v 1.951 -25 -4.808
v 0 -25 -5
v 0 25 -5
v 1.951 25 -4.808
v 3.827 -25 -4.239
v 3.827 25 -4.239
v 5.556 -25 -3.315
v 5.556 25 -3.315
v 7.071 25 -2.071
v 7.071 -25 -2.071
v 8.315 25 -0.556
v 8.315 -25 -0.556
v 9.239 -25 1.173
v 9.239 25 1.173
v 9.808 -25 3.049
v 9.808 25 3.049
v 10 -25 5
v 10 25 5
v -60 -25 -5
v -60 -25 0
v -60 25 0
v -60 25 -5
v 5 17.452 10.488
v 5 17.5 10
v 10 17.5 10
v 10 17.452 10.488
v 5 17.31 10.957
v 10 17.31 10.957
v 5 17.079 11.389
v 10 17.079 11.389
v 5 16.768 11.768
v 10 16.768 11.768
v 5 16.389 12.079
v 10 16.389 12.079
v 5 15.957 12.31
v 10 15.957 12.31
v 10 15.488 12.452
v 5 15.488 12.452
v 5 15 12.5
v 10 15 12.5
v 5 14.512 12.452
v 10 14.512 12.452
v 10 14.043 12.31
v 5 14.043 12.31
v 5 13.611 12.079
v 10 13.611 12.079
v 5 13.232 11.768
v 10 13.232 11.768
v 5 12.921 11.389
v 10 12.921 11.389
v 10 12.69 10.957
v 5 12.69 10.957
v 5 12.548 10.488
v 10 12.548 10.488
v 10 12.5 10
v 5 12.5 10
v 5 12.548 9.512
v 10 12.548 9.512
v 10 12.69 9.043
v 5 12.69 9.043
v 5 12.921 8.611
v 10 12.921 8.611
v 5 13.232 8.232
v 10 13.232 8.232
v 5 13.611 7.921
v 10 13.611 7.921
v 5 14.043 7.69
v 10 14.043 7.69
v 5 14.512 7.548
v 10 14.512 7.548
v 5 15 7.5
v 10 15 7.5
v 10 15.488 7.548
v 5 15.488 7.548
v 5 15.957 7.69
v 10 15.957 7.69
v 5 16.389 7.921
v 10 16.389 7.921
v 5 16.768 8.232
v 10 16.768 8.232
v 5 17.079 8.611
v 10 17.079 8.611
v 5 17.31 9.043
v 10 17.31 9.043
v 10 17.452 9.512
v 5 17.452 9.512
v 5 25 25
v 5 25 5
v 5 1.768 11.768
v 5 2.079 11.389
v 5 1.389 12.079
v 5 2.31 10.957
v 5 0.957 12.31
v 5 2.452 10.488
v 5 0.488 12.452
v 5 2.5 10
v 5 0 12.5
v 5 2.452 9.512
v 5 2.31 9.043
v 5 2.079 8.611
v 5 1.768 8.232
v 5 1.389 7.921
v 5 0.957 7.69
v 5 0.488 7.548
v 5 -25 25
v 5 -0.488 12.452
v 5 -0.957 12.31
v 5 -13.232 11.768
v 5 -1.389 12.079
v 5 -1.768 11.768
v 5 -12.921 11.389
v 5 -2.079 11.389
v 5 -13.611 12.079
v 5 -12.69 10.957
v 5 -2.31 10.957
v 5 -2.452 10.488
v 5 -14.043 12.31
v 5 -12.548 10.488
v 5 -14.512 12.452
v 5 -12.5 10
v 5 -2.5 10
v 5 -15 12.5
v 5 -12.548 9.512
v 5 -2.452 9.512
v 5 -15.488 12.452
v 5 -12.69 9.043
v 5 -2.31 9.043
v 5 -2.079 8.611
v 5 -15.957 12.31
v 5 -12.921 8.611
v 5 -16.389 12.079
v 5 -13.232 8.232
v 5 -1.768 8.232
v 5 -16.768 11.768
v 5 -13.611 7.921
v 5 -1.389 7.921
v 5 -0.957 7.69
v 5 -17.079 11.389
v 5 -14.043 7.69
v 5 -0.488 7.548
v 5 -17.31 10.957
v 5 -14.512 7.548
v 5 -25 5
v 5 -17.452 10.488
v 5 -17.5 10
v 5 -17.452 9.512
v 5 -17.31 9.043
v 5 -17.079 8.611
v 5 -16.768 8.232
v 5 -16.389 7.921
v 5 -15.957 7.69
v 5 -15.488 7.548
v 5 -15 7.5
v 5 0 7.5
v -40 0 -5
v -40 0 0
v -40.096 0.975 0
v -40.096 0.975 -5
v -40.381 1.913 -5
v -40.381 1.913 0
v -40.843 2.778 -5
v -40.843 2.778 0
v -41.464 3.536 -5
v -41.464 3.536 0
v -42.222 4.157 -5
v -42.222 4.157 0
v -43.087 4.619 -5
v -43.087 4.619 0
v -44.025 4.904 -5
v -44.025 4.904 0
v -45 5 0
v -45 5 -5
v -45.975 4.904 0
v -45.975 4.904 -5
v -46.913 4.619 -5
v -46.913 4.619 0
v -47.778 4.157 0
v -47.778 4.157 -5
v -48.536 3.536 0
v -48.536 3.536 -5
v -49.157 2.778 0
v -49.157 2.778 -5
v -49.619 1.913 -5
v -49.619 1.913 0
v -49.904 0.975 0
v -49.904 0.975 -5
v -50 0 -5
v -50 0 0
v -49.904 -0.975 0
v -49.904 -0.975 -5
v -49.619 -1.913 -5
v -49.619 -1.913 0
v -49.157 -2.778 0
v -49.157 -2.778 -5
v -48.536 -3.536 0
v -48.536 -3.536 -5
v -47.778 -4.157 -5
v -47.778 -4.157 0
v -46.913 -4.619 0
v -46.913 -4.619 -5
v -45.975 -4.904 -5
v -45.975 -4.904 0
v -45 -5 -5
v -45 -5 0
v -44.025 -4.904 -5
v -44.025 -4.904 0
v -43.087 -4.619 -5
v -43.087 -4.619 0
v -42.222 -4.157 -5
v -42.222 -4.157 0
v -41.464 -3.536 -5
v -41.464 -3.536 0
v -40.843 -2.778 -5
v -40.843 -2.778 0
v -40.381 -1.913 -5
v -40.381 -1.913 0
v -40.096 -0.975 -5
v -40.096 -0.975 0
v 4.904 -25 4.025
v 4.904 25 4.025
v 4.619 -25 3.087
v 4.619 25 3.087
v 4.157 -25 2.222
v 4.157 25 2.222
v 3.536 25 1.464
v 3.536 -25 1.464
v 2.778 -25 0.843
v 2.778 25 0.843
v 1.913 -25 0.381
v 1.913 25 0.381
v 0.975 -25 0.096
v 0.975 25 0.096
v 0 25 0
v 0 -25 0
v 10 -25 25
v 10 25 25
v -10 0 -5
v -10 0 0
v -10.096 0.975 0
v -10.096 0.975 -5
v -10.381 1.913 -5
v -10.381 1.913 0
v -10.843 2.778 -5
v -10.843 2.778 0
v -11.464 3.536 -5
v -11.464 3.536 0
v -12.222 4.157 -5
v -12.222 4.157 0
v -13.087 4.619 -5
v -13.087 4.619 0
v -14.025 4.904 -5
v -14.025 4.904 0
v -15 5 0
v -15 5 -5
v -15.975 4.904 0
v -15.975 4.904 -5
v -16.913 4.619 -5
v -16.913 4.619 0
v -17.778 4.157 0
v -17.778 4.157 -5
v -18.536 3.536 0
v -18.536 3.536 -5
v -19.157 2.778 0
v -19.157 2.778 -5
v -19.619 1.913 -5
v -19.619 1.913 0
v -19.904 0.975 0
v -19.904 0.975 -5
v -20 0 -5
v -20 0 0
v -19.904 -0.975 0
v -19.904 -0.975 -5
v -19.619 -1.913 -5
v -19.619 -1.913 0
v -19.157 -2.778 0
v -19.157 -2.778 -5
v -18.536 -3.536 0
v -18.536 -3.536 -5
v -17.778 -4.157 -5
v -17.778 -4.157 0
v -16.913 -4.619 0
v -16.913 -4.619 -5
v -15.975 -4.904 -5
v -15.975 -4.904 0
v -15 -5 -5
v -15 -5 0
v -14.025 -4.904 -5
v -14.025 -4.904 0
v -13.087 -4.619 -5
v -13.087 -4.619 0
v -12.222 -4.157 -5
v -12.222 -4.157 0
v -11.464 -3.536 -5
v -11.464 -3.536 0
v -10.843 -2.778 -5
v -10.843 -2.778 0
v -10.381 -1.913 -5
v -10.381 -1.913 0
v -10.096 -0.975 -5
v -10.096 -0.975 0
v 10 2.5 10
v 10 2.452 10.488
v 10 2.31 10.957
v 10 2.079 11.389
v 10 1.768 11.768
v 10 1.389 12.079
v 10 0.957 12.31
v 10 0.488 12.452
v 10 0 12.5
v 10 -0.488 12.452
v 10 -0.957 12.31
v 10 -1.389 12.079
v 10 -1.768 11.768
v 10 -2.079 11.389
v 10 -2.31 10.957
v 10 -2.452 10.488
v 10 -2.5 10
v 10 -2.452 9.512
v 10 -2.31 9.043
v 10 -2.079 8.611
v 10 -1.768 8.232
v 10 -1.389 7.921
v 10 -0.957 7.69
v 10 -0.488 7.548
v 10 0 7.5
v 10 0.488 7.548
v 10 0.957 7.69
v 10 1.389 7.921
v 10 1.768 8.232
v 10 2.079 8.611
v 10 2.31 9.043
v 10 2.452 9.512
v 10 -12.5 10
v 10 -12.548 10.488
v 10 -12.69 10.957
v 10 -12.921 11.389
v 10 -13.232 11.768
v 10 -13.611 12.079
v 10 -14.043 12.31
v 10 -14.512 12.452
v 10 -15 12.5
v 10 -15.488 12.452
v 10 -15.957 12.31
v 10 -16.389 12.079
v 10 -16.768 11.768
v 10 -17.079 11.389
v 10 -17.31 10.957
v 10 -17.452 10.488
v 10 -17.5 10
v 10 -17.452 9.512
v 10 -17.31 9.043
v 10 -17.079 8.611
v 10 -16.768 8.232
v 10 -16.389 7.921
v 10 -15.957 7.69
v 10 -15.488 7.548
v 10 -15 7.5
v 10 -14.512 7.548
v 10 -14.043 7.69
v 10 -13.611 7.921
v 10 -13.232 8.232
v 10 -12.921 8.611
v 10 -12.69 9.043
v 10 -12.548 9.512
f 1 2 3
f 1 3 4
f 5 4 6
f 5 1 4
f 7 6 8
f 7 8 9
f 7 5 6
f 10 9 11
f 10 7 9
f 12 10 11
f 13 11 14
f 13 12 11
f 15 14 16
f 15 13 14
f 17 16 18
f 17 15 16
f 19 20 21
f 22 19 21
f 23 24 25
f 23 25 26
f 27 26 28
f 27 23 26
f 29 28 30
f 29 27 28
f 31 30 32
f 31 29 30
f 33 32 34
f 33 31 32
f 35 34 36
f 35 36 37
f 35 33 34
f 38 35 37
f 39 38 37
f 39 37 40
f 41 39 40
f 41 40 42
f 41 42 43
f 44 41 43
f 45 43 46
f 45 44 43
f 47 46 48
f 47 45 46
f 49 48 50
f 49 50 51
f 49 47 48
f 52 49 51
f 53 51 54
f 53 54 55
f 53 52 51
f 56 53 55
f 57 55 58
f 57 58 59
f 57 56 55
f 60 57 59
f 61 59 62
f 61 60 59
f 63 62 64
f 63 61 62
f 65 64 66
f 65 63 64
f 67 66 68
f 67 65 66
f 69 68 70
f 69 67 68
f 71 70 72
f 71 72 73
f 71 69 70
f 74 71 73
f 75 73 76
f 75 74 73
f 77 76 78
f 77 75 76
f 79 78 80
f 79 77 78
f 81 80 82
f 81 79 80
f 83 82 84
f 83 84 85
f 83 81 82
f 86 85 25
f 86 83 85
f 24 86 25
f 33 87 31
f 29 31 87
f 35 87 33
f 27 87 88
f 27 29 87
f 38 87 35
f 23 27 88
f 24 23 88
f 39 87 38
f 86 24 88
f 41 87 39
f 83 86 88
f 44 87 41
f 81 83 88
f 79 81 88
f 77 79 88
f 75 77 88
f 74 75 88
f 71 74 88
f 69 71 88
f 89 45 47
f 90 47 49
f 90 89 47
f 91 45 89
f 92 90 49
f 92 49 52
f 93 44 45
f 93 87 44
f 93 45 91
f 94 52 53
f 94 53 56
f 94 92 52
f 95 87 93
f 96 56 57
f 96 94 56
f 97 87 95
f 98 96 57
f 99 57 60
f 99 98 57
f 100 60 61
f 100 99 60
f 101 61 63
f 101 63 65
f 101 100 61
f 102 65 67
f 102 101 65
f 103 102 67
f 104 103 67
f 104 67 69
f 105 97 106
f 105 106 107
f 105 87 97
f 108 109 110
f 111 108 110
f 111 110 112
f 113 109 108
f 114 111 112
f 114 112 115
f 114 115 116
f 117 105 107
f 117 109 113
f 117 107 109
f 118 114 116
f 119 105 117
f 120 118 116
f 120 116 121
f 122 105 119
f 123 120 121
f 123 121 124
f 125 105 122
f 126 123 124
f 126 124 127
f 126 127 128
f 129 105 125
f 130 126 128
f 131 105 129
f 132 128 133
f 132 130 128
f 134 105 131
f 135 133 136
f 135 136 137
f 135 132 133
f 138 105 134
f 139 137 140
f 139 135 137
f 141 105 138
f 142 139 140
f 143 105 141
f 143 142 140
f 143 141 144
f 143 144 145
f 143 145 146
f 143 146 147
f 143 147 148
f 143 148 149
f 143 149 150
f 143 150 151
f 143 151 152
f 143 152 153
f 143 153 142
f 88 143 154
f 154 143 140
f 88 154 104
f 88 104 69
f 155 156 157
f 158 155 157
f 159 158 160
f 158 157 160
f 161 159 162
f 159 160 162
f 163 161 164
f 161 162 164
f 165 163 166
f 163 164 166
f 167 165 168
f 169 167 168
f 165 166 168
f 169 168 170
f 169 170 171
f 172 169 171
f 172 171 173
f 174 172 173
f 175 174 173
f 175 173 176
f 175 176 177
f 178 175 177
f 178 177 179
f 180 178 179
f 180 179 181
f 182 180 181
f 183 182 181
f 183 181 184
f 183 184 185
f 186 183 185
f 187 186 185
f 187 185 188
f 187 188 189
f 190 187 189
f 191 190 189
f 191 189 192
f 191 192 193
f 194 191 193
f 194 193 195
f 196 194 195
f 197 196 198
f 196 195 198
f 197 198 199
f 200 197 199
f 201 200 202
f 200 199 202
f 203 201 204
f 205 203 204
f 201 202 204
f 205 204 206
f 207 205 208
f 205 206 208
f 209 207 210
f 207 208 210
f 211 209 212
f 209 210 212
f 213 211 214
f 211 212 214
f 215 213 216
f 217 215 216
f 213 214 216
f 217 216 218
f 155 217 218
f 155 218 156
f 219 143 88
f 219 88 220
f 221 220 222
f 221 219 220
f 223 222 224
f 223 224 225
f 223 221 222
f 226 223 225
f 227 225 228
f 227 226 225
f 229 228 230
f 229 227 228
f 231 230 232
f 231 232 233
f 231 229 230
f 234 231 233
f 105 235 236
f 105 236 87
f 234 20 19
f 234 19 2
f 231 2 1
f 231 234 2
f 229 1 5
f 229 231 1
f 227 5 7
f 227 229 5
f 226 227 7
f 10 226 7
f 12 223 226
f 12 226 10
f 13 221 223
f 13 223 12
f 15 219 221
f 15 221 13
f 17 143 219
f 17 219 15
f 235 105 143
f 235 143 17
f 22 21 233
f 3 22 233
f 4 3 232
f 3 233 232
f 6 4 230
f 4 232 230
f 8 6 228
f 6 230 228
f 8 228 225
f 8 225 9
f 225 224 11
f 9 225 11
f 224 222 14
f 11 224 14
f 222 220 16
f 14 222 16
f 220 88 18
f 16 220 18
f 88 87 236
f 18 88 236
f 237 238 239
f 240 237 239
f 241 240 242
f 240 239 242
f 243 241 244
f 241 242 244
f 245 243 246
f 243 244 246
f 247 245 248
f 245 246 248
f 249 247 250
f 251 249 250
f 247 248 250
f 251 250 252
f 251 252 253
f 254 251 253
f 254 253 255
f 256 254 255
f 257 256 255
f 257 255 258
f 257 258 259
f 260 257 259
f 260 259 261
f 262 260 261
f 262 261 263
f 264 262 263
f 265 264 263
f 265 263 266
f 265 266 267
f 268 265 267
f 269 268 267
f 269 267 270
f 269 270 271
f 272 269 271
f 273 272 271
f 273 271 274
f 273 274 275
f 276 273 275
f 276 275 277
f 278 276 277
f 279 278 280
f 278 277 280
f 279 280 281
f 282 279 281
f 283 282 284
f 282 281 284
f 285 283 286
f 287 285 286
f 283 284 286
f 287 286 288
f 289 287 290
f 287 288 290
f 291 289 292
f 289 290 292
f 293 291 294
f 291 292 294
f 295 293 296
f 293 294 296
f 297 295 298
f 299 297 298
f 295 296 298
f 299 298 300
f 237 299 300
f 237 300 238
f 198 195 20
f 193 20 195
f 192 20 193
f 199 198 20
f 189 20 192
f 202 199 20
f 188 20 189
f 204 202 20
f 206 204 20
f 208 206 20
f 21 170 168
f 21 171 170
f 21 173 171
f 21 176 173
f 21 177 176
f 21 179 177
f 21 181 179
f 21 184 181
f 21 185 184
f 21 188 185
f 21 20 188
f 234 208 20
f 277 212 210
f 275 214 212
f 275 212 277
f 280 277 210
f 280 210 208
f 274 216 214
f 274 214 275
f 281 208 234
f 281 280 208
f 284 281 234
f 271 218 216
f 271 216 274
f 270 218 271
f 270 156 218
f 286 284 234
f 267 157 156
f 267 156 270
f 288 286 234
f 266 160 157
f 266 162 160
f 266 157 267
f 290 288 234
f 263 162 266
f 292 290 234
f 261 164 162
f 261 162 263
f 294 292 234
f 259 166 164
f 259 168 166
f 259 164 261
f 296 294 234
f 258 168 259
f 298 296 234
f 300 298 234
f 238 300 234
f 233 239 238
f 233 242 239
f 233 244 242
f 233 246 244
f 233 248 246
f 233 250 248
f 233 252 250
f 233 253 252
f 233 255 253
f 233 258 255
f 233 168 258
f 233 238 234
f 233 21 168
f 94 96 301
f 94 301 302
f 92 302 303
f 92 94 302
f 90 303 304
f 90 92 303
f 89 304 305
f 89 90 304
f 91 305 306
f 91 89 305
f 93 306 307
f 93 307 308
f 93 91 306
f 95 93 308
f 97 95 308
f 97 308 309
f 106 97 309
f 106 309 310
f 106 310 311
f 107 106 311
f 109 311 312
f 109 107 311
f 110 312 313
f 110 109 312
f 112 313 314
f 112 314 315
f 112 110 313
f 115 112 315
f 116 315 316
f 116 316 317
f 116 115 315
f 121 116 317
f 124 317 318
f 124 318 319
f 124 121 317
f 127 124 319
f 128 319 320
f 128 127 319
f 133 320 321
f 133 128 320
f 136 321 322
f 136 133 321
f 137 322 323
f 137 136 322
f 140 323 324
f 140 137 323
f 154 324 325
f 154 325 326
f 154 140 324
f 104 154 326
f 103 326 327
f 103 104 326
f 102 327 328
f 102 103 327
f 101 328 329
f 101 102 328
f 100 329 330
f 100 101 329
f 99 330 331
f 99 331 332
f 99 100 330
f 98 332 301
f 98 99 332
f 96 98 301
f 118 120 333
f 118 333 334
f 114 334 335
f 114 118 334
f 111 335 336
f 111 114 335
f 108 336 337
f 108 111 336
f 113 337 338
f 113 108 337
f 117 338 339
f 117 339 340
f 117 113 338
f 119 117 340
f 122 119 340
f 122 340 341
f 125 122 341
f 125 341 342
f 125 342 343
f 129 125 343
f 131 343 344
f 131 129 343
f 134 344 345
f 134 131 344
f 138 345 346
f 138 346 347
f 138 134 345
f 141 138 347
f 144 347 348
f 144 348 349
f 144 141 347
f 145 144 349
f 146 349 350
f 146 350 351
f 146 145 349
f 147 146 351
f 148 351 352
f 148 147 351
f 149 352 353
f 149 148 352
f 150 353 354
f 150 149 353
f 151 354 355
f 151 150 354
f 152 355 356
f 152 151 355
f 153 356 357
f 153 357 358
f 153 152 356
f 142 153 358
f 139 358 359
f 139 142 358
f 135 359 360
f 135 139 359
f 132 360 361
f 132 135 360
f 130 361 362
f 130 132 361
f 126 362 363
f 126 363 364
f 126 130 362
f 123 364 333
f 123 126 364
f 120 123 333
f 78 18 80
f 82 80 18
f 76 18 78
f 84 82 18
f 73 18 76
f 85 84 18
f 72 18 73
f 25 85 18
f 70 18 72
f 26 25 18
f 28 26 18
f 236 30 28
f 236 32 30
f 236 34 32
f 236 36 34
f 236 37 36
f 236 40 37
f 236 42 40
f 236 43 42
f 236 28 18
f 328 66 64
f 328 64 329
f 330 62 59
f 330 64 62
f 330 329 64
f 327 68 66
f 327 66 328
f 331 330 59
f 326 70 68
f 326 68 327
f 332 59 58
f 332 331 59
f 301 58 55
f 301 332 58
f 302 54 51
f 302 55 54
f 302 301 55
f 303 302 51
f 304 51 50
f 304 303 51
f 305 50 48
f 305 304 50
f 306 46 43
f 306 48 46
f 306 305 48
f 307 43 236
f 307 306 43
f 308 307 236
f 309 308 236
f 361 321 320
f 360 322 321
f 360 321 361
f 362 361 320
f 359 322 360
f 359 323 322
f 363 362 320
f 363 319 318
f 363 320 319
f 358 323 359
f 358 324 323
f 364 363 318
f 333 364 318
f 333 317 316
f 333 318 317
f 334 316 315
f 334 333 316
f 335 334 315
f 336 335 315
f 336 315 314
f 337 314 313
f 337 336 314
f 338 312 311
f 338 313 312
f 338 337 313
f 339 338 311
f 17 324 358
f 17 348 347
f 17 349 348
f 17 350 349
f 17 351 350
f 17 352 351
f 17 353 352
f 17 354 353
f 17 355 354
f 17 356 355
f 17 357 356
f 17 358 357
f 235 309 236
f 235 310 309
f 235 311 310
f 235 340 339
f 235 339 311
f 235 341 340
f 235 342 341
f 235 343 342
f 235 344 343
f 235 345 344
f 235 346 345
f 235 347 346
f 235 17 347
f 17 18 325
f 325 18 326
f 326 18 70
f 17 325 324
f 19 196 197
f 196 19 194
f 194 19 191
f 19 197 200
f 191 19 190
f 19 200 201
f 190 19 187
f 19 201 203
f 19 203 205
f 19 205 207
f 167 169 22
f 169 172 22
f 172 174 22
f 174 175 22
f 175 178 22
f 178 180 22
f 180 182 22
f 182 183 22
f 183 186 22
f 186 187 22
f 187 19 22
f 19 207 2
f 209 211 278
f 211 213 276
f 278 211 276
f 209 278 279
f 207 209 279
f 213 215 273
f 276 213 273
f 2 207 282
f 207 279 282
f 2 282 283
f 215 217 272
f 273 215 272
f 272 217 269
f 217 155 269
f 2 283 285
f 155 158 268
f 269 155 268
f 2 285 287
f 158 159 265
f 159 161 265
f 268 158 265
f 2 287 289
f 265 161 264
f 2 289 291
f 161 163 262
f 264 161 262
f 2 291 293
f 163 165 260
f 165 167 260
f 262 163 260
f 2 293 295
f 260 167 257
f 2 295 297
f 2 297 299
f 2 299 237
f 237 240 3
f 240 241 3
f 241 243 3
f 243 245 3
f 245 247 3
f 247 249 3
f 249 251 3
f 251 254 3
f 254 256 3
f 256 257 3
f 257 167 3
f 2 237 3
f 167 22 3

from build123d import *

# Parameters (mm, degrees)
SKETCH1_W           = 60
SKETCH1_H           = 50
BASE_FLANGE1_DEPTH  = 5
SKETCH6_R           = 5
CUT_EXTRUDE1_DEPTH  = 66.192024052
EDGE_FLANGE1_DEPTH  = 50
HOLE1_START         = 5
HOLE1_OUTLINE_R     = 2.5
HOLE1_DEPTH         = 5
LPATTERN1_COUNT     = 2
LPATTERN1_PITCH     = 15
LPATTERN1_COL_COUNT = 2
LPATTERN1_COL_PITCH = 15


# Read off the part's stored shape, not the designer's step: Hole1
# Sheet-metal steps are written as plain solids
with BuildPart() as part:
    # Sketch1 → Base-Flange1 (new body)
    with BuildSketch(Plane.XY):
        with Locations((-30, 0)):
            Rectangle(SKETCH1_W, SKETCH1_H)
    extrude(amount=-BASE_FLANGE1_DEPTH)

    # Sketch6 → Cut-Extrude1 (cut, through all)
    with BuildSketch(Plane.XY):
        with Locations((-45, 0)):
            Circle(SKETCH6_R)
        with Locations((-15, 0)):
            Circle(SKETCH6_R)
    extrude(amount=-CUT_EXTRUDE1_DEPTH, mode=Mode.SUBTRACT)

    # Edge-Flange1 section (across the edge) → Edge-Flange1 (add)
    with BuildSketch(Plane(origin=(5, -25, 0), x_dir=(-1, 0, 0), z_dir=(0, 1, 0))):
        with BuildLine():
            Line((-5, 5), (-5, 25))
            Line((-5, 25), (0, 25))
            Line((0, 25), (0, 5))
            ThreePointArc((0, 5), (1.464466094, 1.464466094), (5, 0))
            Line((5, 0), (5, -5))
            ThreePointArc((5, -5), (-2.071067812, -2.071067812), (-5, 5))
        make_face()
    extrude(amount=EDGE_FLANGE1_DEPTH)

    # Hole1 outline → Hole1 (cut)
    with BuildSketch(Plane.YZ.offset(HOLE1_START)):
        with Locations((0, 10)):
            Circle(HOLE1_OUTLINE_R)
    hole1 = extrude(amount=HOLE1_DEPTH, mode=Mode.SUBTRACT)

    # LPattern1: Hole1 ×2
    with Locations(*[(0, i * LPATTERN1_PITCH, 0) for i in range(1, LPATTERN1_COUNT)]):
        add(hole1, mode=Mode.SUBTRACT)

    # LPattern1 col: Hole1 ×2
    with Locations(*[(0, -i * LPATTERN1_COL_PITCH, 0) for i in range(1, LPATTERN1_COL_COUNT)]):
        add(hole1, mode=Mode.SUBTRACT)


solid = part.part
